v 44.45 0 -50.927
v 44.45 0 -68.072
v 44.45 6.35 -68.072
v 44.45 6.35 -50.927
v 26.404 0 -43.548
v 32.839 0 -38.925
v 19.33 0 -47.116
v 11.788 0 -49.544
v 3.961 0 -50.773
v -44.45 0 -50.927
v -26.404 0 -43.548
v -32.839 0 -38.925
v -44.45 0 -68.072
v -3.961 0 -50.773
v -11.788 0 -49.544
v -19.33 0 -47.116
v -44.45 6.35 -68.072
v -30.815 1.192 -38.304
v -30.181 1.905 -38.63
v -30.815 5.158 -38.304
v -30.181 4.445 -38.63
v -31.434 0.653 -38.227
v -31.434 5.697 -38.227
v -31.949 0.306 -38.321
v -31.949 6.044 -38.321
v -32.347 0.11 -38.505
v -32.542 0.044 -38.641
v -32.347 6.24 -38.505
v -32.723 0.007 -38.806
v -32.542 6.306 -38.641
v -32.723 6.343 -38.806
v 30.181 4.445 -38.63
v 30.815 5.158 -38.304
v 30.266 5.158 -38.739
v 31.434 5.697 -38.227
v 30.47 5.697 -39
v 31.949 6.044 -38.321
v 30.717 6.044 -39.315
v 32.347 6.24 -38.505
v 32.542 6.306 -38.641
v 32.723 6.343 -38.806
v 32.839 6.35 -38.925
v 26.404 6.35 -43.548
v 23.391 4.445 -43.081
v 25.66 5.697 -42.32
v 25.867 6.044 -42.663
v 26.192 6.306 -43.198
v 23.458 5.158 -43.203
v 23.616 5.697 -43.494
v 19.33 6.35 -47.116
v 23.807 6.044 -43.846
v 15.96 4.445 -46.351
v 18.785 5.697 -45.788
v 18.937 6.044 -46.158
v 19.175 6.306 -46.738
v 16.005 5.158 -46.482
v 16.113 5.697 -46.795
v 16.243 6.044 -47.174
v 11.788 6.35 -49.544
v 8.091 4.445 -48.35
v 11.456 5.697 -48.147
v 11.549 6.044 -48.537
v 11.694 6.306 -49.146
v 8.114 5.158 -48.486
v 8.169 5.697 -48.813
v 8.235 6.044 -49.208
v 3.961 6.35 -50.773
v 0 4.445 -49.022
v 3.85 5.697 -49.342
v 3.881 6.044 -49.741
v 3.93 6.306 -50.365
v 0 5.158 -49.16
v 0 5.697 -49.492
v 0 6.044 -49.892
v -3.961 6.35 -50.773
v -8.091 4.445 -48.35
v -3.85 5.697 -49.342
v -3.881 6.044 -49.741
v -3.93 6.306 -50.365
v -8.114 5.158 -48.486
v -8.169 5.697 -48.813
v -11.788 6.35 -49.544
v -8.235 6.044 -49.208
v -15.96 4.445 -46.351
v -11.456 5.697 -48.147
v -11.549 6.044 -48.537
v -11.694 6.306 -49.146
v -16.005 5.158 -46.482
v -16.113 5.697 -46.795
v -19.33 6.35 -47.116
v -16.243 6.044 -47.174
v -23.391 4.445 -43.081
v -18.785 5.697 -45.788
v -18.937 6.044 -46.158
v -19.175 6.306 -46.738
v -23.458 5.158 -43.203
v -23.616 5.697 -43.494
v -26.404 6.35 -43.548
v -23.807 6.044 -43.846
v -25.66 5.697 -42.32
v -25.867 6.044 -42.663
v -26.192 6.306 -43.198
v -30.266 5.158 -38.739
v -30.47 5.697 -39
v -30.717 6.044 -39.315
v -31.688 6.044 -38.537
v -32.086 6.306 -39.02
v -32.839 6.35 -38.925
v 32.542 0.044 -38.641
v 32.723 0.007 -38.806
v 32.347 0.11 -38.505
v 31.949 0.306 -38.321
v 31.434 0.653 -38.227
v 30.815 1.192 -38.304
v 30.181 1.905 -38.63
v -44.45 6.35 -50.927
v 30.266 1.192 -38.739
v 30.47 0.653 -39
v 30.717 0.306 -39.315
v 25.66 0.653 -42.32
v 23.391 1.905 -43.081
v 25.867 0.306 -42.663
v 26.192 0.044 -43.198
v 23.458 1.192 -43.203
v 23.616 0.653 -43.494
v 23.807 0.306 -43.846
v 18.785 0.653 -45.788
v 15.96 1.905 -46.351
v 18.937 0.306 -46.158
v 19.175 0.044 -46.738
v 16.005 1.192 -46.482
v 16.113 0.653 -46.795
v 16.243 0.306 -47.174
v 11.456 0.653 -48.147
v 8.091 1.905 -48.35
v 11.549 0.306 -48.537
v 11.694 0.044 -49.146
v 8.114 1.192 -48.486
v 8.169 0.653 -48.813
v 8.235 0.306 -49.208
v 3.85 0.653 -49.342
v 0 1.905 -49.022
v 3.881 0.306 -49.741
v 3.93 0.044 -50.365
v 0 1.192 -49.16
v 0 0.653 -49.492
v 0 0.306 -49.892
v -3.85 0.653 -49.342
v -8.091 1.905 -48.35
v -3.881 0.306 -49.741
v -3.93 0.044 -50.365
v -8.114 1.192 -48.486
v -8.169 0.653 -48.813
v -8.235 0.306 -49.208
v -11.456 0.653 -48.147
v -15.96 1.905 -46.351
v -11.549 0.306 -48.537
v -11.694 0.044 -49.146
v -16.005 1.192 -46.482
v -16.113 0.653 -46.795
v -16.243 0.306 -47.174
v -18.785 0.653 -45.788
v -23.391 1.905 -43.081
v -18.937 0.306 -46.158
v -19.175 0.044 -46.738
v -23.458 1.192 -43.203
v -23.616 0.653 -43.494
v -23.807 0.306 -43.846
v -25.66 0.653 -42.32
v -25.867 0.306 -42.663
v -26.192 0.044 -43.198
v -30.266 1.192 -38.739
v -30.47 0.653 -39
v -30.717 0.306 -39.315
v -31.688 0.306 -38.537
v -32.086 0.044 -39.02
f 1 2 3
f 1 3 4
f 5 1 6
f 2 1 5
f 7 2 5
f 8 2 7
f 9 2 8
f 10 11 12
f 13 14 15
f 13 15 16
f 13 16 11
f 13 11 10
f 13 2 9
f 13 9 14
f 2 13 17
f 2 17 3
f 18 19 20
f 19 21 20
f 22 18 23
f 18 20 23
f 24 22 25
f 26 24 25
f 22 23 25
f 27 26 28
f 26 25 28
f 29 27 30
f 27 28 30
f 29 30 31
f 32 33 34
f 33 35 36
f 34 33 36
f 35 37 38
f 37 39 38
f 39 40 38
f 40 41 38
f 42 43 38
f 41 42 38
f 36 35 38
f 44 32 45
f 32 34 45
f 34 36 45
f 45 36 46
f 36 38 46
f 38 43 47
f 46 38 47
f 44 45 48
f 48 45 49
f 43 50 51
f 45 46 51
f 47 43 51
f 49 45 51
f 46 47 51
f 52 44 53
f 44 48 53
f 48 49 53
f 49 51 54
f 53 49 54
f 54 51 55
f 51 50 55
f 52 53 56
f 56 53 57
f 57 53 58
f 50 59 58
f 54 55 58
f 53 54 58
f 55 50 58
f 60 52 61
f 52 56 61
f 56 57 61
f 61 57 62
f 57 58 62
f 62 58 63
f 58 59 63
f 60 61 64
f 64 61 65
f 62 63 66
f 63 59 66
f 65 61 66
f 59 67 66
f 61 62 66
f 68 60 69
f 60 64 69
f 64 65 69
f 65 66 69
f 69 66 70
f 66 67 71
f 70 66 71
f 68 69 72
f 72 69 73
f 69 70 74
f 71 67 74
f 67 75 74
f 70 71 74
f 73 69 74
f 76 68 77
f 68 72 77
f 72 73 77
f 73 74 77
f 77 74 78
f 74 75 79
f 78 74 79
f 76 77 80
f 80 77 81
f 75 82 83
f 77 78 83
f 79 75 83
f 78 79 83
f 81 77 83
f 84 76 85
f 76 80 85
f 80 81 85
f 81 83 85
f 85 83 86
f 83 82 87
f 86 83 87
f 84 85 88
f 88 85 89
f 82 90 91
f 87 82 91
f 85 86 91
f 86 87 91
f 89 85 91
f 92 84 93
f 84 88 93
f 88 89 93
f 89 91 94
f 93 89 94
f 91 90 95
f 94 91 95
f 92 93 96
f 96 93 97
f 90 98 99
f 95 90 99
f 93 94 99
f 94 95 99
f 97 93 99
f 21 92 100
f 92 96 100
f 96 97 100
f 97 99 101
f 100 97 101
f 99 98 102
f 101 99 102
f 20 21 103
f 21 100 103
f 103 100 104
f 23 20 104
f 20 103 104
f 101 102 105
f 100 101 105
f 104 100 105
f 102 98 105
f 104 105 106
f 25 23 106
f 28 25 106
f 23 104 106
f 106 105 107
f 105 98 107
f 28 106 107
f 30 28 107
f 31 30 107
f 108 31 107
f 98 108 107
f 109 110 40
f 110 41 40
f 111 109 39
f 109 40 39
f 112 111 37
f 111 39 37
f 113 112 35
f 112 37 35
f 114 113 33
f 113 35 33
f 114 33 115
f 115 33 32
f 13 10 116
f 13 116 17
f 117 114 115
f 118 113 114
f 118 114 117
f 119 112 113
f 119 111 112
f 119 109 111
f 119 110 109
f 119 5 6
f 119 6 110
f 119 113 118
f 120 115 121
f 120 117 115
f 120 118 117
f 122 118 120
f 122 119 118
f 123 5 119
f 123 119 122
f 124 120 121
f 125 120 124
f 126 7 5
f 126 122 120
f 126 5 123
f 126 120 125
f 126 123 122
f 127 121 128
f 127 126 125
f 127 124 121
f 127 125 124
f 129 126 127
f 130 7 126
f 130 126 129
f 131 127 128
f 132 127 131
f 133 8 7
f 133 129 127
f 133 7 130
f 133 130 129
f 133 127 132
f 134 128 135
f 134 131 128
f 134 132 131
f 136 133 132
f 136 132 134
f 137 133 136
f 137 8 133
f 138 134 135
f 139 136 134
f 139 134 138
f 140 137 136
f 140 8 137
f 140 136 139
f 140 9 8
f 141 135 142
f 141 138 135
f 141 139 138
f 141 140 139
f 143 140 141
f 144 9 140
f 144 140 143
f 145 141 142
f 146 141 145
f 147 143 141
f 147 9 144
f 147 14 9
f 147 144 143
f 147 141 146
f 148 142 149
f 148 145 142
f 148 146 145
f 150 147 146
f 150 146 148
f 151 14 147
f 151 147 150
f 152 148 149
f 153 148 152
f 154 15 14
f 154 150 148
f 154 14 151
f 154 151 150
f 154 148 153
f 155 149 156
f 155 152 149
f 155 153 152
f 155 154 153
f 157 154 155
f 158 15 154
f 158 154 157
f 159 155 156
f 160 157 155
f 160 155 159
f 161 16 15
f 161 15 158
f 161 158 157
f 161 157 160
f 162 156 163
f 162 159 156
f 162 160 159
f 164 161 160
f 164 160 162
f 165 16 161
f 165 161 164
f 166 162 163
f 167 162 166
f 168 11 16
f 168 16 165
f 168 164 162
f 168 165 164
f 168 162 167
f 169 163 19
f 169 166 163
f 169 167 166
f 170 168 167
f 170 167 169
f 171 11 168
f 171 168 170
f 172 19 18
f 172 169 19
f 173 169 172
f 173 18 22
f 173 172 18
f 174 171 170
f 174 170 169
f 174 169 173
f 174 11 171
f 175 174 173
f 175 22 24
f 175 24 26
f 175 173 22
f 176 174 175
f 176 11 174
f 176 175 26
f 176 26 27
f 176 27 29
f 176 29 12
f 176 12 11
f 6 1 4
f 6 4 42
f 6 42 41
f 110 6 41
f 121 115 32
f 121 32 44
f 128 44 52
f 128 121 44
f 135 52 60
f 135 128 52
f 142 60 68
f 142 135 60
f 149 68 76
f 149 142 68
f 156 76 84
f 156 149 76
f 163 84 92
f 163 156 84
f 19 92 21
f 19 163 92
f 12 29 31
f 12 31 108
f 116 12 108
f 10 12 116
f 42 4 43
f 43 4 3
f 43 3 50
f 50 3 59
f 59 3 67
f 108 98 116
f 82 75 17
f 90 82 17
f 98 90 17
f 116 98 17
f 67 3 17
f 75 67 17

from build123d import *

# Parameters (mm, degrees)
BOSS_EXTRUDE1_DEPTH = 6.35
FILLET1_R           = 1.905


with BuildPart() as part:
    # Sketch1 → Boss-Extrude1 (new body)
    with BuildSketch(Plane(origin=(0, 0, 0), x_dir=(1, 0, 0), z_dir=(0, 1, 0))):
        with BuildLine():
            Line((-44.45, 68.072), (44.45, 68.072))
            Line((44.45, 68.072), (44.45, 50.927))
            Line((44.45, 50.927), (31.510734202, 37.553030691))
            ThreePointArc((31.510734202, 37.553030691), (0, 49.022), (-31.510734202, 37.553030691))
            Line((-31.510734202, 37.553030691), (-44.45, 50.927))
            Line((-44.45, 50.927), (-44.45, 68.072))
        make_face()
    extrude(amount=BOSS_EXTRUDE1_DEPTH)

    # Fillet1
    fillet1_edges = [part.edges().sort_by_distance(p)[0] for p in [
        (31.510734202, 3.175, -37.553030691),
        (-31.510734202, 3.175, -37.553030691),
        (0, 6.35, -49.022),
        (0, 0, -49.022),
    ]]
    fillet(fillet1_edges, radius=FILLET1_R)


solid = part.part
